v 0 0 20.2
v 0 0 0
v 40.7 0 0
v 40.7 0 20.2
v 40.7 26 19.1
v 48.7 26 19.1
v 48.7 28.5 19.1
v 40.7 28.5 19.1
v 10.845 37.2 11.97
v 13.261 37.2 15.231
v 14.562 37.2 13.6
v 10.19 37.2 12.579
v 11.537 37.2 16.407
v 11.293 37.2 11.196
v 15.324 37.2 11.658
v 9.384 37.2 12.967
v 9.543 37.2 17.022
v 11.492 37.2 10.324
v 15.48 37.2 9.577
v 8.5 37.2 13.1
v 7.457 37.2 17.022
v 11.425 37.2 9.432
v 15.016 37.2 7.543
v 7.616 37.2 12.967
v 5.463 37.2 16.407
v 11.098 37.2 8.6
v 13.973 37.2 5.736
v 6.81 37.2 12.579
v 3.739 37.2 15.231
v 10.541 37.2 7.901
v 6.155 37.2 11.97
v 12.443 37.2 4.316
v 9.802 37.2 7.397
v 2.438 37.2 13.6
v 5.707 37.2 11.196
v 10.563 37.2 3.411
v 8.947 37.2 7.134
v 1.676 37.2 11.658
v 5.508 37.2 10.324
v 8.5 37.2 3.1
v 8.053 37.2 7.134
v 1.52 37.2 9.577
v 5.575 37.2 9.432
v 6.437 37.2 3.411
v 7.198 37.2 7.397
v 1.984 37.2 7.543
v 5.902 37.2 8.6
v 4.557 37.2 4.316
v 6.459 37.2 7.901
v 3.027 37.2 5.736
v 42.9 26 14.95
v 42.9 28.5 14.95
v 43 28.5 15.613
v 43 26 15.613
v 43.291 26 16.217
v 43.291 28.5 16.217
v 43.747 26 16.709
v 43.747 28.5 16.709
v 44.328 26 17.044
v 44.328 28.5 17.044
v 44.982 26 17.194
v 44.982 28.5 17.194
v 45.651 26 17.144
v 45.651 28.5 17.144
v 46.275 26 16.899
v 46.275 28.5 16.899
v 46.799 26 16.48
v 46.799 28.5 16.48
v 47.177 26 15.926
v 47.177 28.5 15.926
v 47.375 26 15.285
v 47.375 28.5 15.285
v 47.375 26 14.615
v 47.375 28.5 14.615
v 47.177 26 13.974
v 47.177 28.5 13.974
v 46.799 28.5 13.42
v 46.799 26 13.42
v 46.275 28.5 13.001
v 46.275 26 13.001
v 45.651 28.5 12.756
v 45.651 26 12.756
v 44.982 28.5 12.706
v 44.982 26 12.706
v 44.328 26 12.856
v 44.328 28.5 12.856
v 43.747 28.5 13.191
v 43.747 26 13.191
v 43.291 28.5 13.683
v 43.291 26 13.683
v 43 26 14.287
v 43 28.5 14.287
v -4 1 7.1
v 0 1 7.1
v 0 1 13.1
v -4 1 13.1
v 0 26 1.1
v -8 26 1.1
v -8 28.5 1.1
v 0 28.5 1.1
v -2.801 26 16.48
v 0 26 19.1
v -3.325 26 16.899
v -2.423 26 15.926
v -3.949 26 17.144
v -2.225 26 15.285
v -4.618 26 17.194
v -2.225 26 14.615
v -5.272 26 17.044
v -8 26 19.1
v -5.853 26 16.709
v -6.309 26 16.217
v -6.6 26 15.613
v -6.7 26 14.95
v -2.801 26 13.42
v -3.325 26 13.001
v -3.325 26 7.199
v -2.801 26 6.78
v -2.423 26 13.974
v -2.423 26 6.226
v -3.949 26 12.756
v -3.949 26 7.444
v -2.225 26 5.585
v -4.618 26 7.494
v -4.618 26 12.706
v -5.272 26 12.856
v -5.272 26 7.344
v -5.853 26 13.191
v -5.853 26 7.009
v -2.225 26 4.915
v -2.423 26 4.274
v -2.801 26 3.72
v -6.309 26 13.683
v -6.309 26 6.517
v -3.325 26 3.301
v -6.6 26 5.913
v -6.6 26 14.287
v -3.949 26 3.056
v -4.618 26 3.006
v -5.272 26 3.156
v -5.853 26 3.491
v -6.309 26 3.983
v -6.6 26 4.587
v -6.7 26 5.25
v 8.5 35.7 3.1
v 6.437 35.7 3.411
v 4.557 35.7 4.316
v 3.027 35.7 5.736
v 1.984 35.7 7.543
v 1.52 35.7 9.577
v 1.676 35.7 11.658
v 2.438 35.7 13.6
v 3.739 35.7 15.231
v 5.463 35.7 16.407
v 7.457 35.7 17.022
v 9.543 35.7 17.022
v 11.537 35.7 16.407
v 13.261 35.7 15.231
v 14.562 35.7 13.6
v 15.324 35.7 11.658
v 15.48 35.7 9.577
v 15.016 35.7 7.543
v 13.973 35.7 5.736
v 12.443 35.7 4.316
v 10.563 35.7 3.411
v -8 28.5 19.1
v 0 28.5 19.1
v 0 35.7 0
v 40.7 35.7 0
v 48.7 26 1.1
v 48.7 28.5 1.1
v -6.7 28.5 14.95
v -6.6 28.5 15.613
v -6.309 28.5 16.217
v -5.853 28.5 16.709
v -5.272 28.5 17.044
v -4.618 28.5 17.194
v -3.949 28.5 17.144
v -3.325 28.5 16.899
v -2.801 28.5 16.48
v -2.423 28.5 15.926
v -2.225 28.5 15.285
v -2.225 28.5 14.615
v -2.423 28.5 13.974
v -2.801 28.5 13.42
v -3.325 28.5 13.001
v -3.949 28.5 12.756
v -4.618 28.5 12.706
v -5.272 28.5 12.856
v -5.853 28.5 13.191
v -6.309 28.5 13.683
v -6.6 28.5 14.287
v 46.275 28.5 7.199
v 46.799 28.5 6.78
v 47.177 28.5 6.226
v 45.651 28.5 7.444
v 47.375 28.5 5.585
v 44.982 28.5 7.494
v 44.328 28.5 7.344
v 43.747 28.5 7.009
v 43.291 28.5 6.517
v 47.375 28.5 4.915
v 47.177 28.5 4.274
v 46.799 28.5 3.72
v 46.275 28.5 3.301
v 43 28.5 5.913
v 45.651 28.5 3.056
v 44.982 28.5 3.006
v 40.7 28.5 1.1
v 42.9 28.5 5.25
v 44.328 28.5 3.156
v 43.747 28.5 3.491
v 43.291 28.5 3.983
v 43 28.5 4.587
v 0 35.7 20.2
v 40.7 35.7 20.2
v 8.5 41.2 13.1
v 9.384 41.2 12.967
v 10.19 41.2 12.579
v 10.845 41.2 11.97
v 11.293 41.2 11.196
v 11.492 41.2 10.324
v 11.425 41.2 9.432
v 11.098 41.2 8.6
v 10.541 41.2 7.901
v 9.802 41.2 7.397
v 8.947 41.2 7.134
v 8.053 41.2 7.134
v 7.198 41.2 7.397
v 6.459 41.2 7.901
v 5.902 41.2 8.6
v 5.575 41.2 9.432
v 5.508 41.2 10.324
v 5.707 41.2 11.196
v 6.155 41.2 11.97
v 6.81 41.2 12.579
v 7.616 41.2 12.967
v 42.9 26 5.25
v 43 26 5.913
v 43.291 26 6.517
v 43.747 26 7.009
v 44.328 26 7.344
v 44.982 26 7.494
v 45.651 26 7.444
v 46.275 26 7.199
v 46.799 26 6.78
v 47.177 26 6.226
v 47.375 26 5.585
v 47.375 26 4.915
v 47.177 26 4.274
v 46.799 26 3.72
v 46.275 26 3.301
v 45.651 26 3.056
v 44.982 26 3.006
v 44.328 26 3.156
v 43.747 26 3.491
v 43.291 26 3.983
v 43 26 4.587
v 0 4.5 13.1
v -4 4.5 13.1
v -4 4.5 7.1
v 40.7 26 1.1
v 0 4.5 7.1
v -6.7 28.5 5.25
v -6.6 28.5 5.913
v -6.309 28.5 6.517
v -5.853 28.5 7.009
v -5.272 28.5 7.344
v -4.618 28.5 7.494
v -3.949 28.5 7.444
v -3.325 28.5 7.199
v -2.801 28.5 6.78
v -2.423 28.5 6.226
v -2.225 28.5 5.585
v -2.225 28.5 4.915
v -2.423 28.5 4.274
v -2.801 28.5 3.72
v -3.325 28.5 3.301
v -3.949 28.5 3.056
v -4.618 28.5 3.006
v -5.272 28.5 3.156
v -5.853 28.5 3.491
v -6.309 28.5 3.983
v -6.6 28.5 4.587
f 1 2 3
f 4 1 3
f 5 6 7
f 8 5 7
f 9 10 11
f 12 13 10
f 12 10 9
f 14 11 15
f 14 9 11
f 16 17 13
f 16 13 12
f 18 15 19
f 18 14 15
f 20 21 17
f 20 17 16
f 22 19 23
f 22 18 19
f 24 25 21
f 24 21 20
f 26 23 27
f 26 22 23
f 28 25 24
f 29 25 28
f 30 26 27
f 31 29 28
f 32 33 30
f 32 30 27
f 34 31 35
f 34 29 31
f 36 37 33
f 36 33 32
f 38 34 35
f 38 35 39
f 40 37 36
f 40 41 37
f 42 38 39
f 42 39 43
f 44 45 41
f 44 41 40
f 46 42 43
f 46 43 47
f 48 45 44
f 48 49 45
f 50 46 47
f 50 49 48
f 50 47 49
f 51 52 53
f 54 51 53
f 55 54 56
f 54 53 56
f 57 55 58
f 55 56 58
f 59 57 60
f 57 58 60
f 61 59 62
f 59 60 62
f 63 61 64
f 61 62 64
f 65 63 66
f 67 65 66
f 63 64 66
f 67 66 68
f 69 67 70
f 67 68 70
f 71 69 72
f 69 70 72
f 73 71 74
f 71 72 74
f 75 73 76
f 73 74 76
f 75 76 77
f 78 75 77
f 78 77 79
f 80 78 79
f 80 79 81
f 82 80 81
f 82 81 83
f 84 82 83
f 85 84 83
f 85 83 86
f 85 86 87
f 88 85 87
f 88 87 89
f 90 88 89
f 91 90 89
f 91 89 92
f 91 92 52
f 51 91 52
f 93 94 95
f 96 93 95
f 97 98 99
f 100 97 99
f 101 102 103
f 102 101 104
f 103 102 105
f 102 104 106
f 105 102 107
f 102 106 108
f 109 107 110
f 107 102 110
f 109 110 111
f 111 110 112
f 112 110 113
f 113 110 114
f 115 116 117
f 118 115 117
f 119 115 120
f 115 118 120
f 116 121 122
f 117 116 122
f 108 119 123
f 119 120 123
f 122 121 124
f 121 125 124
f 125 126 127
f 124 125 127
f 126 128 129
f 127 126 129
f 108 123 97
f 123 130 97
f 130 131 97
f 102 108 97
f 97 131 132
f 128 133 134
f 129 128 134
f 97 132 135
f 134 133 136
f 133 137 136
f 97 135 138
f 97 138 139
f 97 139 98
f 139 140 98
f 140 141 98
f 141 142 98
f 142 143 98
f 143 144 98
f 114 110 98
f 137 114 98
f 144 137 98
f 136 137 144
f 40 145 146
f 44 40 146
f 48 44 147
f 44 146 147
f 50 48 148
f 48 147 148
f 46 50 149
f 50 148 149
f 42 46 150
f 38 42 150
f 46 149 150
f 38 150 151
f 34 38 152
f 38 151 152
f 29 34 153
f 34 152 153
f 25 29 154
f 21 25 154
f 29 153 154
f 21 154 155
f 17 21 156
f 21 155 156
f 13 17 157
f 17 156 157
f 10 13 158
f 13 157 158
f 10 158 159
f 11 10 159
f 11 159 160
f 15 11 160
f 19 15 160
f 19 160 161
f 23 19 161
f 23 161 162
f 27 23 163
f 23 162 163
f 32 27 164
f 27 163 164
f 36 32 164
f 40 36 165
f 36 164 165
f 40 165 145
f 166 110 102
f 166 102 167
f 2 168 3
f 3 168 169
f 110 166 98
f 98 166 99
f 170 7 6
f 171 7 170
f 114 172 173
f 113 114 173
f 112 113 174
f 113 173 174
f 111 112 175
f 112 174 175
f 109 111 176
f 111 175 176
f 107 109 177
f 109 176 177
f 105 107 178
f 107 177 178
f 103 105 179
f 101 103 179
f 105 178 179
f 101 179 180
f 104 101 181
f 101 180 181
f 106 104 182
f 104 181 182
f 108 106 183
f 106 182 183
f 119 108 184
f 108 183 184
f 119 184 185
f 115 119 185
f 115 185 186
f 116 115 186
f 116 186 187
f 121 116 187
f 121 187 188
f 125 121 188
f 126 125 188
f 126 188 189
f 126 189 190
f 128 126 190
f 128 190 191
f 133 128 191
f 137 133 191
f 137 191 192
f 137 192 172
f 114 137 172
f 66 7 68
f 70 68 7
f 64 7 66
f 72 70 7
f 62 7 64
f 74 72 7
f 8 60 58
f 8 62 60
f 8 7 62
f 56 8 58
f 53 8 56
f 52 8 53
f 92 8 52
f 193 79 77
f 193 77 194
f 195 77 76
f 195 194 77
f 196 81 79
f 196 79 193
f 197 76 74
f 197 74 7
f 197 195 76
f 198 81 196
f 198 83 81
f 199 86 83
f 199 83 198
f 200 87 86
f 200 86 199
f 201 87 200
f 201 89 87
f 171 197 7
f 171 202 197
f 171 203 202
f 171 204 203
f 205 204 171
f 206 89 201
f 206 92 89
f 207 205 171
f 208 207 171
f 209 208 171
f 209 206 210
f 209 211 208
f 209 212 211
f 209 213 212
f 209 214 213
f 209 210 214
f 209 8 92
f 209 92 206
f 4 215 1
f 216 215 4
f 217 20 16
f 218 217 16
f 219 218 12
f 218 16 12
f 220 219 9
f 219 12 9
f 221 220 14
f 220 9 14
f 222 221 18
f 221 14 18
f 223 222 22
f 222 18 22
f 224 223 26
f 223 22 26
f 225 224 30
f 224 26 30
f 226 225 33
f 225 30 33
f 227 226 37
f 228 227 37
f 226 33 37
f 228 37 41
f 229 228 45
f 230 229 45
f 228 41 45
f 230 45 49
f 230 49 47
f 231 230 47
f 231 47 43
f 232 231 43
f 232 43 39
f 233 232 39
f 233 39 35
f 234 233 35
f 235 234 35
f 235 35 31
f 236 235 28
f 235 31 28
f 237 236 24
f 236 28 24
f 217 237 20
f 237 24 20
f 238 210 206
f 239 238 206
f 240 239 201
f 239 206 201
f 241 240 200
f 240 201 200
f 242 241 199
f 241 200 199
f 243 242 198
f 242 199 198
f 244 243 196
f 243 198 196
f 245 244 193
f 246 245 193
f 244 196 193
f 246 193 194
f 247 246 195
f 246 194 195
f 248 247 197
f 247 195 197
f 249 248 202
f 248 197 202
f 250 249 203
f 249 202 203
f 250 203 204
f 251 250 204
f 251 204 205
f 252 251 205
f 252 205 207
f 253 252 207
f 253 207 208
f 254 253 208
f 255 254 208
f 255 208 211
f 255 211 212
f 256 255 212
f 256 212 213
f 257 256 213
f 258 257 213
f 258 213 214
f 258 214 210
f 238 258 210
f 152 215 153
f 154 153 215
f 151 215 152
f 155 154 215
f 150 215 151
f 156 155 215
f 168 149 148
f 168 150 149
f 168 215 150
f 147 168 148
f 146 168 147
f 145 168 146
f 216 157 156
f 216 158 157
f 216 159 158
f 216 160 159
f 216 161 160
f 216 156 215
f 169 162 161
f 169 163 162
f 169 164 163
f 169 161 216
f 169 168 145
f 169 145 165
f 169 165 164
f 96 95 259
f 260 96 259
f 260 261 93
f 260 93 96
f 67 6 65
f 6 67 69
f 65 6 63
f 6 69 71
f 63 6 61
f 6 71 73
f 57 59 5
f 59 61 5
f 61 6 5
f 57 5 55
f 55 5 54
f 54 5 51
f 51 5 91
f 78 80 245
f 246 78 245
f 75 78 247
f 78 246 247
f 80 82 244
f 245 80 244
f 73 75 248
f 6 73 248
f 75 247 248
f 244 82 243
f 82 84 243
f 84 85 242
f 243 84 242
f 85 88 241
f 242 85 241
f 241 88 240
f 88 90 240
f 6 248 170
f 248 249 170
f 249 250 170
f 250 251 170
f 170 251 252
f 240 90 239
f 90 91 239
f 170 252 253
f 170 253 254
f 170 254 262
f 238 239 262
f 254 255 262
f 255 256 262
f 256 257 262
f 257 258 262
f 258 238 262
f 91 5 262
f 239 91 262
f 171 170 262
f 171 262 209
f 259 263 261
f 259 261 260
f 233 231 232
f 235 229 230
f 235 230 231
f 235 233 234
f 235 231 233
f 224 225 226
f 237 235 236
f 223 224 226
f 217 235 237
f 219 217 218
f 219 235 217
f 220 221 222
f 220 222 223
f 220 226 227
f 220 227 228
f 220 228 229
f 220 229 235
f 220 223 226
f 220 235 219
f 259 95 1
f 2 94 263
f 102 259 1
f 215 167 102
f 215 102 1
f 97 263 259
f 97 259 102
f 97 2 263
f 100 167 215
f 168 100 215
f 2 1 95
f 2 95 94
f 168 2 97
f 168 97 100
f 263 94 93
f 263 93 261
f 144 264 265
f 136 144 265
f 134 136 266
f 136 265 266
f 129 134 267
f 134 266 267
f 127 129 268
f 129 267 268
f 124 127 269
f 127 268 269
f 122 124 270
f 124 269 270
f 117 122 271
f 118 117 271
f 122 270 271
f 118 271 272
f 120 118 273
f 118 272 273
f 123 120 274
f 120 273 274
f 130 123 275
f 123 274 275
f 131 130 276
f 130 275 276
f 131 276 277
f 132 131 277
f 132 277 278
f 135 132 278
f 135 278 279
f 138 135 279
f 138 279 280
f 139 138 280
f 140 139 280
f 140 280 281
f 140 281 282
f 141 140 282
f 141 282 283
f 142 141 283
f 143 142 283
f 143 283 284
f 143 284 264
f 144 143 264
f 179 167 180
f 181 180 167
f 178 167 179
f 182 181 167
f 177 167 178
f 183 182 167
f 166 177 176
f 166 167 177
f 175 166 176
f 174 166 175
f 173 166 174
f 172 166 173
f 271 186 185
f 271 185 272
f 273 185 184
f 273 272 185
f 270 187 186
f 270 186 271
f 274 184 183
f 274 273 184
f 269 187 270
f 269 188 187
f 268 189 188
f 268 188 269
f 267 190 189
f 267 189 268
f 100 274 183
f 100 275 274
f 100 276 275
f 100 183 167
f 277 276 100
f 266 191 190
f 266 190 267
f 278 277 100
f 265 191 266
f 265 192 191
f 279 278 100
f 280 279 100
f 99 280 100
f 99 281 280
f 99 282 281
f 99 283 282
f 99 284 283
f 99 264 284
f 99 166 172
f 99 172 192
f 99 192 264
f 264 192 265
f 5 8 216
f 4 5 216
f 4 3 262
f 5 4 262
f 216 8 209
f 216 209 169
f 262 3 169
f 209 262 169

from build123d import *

# Parameters (mm, degrees)
SKIZZE1_W                            = 40.7
SKIZZE1_H                            = 35.7
AUFSATZ_LINEAR_AUSTRAGEN1_DEPTH      = 20.2
AUFSATZ_LINEAR_AUSTRAGEN2_DEPTH      = 8
AUFSATZ_LINEAR_AUSTRAGEN2_DEPTH_BACK = 48.7
SKIZZE2_W                            = 18
SKIZZE2_H                            = 2.5
SKIZZE3_R                            = 2.25
SCHNITT_LINEAR_AUSTRAGEN1_DEPTH      = 8
SKIZZE4_R                            = 7
AUFSATZ_LINEAR_AUSTRAGEN3_DEPTH      = 1.5
SKIZZE5_R                            = 3
AUFSATZ_LINEAR_AUSTRAGEN4_DEPTH      = 4
SKIZZE6_W                            = 6
SKIZZE6_H                            = 3.5
AUFSATZ_LINEAR_AUSTRAGEN5_DEPTH      = 4


with BuildPart() as part:
    # Skizze1 → Aufsatz-Linear austragen1 (new body)
    with BuildSketch(Plane.XY):
        with Locations((20.35, 17.85)):
            Rectangle(SKIZZE1_W, SKIZZE1_H)
    extrude(amount=AUFSATZ_LINEAR_AUSTRAGEN1_DEPTH)

    # Skizze2 → Aufsatz-Linear austragen2 (add, two sides: drawn at the far end of the back side and taken through both)
    with BuildSketch(Plane(origin=(40.7, 0, 0), x_dir=(0, 0, -1), z_dir=(1, 0, 0)).offset(-AUFSATZ_LINEAR_AUSTRAGEN2_DEPTH_BACK)):
        with Locations((-10.1, 27.25)):
            Rectangle(SKIZZE2_W, SKIZZE2_H)
    extrude(amount=AUFSATZ_LINEAR_AUSTRAGEN2_DEPTH + AUFSATZ_LINEAR_AUSTRAGEN2_DEPTH_BACK)

    # Skizze3 → Schnitt-Linear austragen1 (cut)
    with BuildSketch(Plane(origin=(0, 28.5, 0), x_dir=(1, 0, 0), z_dir=(0, 1, 0))):
        with Locations(Location((45.15, -5.25, 0), (0, 0, 180))):
            Circle(SKIZZE3_R)
        with Locations(Location((45.15, -14.95, 0), (0, 0, 180))):
            Circle(SKIZZE3_R)
        with Locations(Location((-4.45, -5.25, 0), (0, 0, 180))):
            Circle(SKIZZE3_R)
        with Locations(Location((-4.45, -14.95, 0), (0, 0, 180))):
            Circle(SKIZZE3_R)
    extrude(amount=-SCHNITT_LINEAR_AUSTRAGEN1_DEPTH, mode=Mode.SUBTRACT)

    # Skizze4 → Aufsatz-Linear austragen3 (add)
    with BuildSketch(Plane(origin=(0, 35.7, 0), x_dir=(1, 0, 0), z_dir=(0, 1, 0))):
        with Locations(Location((8.5, -10.1, 0), (0, 0, 90))):
            Circle(SKIZZE4_R)
    extrude(amount=AUFSATZ_LINEAR_AUSTRAGEN3_DEPTH)

    # Skizze5 → Aufsatz-Linear austragen4 (add)
    with BuildSketch(Plane(origin=(0, 37.2, 0), x_dir=(1, 0, 0), z_dir=(0, 1, 0))):
        with Locations(Location((8.5, -10.1, 0), (0, 0, 270))):
            Circle(SKIZZE5_R)
    extrude(amount=AUFSATZ_LINEAR_AUSTRAGEN4_DEPTH)

    # Skizze6 → Aufsatz-Linear austragen5 (add)
    with BuildSketch(Plane.ZY):
        with Locations((10.1, 2.75)):
            Rectangle(SKIZZE6_W, SKIZZE6_H)
    extrude(amount=AUFSATZ_LINEAR_AUSTRAGEN5_DEPTH)


solid = part.part
